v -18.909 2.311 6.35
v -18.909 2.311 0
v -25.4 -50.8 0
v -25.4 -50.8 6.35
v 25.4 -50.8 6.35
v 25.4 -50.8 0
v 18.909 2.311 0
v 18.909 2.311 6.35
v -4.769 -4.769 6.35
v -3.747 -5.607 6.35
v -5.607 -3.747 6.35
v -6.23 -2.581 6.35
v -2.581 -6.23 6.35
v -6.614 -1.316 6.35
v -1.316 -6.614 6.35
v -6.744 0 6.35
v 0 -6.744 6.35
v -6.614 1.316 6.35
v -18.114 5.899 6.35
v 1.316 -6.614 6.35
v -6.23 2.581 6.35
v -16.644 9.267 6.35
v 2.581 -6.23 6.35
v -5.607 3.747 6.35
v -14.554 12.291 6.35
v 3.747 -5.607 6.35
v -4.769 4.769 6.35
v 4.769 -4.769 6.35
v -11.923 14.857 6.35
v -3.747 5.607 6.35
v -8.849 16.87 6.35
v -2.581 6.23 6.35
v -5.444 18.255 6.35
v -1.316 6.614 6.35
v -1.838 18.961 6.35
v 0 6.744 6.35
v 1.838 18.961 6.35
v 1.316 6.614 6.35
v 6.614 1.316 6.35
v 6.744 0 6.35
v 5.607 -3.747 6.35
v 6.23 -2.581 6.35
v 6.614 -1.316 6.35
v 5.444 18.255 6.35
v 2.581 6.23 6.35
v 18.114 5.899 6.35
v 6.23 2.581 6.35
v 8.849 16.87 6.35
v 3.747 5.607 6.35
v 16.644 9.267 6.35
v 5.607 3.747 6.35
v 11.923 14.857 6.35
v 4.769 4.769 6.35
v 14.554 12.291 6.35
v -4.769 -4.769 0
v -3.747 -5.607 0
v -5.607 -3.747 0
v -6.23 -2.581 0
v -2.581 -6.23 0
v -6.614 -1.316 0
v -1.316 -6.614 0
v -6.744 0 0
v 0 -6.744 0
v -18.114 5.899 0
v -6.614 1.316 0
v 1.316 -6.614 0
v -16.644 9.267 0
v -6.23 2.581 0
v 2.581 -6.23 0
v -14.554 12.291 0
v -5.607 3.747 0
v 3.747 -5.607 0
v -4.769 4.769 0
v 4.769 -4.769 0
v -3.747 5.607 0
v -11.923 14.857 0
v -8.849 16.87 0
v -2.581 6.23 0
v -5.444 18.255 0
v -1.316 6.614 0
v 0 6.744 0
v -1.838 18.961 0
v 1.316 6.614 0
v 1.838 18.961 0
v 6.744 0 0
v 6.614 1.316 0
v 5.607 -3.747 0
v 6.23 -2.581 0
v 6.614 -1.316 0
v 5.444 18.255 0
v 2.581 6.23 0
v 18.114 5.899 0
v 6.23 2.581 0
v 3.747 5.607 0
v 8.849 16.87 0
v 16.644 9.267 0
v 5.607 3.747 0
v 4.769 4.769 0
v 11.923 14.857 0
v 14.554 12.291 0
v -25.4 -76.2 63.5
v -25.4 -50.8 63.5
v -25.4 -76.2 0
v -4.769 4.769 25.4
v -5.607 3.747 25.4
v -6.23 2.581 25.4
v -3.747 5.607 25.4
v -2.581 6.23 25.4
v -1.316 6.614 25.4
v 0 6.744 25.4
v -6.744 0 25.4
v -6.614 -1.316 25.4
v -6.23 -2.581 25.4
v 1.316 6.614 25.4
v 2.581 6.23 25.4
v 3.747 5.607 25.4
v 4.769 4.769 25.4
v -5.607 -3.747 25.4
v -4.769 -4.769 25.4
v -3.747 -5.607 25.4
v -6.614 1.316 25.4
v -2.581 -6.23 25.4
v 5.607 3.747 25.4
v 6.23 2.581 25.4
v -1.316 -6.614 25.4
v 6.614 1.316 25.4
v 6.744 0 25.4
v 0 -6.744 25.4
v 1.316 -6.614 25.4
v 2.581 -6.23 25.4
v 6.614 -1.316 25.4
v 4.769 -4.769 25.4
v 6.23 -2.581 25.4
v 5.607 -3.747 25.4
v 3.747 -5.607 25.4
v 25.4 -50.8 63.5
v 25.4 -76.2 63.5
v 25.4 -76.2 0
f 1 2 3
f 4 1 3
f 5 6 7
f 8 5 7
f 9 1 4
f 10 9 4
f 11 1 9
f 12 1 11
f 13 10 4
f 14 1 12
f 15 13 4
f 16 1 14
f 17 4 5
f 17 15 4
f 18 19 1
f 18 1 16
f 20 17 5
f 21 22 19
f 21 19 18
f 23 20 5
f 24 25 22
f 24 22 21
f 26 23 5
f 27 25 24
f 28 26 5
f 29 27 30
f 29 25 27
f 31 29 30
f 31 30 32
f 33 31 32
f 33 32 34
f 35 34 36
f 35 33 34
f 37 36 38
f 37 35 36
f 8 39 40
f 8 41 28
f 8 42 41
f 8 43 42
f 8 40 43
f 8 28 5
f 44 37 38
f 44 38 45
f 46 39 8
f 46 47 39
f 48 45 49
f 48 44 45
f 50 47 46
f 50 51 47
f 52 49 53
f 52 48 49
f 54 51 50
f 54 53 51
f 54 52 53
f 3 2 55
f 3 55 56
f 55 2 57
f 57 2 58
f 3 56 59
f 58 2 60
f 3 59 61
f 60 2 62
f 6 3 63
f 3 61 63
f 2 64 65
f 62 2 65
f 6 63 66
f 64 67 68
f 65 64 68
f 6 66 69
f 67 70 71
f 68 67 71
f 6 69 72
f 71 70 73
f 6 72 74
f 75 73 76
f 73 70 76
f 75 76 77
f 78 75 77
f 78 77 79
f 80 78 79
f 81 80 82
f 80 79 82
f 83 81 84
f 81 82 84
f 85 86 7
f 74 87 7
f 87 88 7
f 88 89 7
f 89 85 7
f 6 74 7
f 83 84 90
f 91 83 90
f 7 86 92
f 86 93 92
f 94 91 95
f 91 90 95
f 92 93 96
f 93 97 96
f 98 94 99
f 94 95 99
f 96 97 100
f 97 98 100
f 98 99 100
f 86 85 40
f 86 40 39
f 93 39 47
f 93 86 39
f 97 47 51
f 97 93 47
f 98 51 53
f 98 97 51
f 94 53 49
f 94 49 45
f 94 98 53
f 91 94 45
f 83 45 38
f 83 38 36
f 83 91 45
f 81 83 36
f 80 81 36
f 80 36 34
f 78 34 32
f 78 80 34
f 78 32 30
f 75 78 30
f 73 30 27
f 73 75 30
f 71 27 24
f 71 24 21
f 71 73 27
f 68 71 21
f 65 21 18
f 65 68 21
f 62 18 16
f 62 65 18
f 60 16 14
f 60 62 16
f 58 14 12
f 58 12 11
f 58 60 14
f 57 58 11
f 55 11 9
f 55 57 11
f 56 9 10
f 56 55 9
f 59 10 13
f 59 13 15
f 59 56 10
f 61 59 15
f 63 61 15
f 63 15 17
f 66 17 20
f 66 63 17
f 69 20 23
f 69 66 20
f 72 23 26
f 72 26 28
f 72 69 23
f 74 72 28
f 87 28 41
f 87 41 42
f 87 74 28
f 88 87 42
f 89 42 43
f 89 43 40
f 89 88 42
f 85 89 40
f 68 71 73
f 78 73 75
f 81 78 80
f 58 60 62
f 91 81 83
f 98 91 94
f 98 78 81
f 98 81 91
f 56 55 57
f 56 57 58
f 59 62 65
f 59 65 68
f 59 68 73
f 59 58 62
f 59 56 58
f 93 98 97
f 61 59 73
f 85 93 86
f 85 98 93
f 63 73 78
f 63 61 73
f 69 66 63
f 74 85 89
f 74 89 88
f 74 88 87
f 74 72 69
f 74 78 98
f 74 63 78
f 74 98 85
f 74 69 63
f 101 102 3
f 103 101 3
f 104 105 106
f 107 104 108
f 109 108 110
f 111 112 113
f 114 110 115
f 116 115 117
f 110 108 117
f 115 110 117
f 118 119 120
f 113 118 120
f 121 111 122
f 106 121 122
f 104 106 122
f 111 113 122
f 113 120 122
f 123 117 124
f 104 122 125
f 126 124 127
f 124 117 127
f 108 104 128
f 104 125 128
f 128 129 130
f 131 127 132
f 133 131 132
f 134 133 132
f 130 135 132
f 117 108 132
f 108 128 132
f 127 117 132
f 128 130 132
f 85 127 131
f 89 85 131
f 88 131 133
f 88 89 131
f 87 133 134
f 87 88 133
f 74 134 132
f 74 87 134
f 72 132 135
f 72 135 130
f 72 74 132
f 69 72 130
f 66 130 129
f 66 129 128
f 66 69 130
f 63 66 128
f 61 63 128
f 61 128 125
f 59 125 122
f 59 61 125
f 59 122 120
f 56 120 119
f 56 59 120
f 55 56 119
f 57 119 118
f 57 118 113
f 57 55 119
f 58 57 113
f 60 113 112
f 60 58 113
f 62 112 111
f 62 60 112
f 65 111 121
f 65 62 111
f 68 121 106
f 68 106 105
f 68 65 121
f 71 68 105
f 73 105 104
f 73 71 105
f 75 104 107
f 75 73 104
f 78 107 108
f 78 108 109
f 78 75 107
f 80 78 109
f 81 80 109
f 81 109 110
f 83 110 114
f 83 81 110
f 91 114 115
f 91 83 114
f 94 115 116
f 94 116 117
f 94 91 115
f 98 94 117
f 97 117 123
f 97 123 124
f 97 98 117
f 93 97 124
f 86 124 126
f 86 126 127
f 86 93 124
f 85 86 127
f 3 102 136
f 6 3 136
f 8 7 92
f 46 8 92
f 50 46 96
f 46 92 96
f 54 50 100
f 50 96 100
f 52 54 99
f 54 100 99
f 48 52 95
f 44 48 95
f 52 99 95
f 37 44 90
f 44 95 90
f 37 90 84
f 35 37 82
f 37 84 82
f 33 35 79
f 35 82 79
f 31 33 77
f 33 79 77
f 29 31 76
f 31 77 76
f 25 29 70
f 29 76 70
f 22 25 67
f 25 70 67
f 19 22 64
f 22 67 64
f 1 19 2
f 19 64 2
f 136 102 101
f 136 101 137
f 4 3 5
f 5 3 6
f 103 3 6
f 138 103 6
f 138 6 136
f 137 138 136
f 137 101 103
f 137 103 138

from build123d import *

# Parameters (mm, degrees)
F0_R     = 6.7437
F1_DEPTH = 6.35
F2_W     = 50.8
F2_H     = 57.15
F2_H_2   = 6.35
F3_DEPTH = 25.4
F4_R     = 6.7437
F5_DEPTH = 25.4


with BuildPart() as f1:
    # F0 (on Top) → F1 (new body)
    with BuildSketch(Plane.XY):
        with BuildLine():
            Line((25.4, -50.8), (18.909315, 2.310908))
            ThreePointArc((18.909315, 2.310908), (0, 19.05), (-18.909315, 2.310908))
            Line((-18.909315, 2.310908), (-25.4, -50.8))
            Line((-25.4, -50.8), (25.4, -50.8))
        make_face()
        Circle(F0_R, mode=Mode.SUBTRACT)
    extrude(amount=F1_DEPTH)


with BuildPart() as f3:
    # F2 (on face) → F3 (new body)
    with BuildSketch(Plane.XZ.offset(50.8)):
        with Locations((0, 34.925)):
            Rectangle(F2_W, F2_H)
        with Locations((0, 3.175)):
            Rectangle(F2_W, F2_H_2)
    extrude(amount=F3_DEPTH)


with BuildPart() as f5:
    # F4 (on face) → F5 (new body)
    with BuildSketch(Plane(origin=(0, 0, 0), x_dir=(1, 0, 0), z_dir=(0, 0, -1))):
        Circle(F4_R)
    extrude(amount=-F5_DEPTH)


solid = Compound([f1.part, f3.part, f5.part])
